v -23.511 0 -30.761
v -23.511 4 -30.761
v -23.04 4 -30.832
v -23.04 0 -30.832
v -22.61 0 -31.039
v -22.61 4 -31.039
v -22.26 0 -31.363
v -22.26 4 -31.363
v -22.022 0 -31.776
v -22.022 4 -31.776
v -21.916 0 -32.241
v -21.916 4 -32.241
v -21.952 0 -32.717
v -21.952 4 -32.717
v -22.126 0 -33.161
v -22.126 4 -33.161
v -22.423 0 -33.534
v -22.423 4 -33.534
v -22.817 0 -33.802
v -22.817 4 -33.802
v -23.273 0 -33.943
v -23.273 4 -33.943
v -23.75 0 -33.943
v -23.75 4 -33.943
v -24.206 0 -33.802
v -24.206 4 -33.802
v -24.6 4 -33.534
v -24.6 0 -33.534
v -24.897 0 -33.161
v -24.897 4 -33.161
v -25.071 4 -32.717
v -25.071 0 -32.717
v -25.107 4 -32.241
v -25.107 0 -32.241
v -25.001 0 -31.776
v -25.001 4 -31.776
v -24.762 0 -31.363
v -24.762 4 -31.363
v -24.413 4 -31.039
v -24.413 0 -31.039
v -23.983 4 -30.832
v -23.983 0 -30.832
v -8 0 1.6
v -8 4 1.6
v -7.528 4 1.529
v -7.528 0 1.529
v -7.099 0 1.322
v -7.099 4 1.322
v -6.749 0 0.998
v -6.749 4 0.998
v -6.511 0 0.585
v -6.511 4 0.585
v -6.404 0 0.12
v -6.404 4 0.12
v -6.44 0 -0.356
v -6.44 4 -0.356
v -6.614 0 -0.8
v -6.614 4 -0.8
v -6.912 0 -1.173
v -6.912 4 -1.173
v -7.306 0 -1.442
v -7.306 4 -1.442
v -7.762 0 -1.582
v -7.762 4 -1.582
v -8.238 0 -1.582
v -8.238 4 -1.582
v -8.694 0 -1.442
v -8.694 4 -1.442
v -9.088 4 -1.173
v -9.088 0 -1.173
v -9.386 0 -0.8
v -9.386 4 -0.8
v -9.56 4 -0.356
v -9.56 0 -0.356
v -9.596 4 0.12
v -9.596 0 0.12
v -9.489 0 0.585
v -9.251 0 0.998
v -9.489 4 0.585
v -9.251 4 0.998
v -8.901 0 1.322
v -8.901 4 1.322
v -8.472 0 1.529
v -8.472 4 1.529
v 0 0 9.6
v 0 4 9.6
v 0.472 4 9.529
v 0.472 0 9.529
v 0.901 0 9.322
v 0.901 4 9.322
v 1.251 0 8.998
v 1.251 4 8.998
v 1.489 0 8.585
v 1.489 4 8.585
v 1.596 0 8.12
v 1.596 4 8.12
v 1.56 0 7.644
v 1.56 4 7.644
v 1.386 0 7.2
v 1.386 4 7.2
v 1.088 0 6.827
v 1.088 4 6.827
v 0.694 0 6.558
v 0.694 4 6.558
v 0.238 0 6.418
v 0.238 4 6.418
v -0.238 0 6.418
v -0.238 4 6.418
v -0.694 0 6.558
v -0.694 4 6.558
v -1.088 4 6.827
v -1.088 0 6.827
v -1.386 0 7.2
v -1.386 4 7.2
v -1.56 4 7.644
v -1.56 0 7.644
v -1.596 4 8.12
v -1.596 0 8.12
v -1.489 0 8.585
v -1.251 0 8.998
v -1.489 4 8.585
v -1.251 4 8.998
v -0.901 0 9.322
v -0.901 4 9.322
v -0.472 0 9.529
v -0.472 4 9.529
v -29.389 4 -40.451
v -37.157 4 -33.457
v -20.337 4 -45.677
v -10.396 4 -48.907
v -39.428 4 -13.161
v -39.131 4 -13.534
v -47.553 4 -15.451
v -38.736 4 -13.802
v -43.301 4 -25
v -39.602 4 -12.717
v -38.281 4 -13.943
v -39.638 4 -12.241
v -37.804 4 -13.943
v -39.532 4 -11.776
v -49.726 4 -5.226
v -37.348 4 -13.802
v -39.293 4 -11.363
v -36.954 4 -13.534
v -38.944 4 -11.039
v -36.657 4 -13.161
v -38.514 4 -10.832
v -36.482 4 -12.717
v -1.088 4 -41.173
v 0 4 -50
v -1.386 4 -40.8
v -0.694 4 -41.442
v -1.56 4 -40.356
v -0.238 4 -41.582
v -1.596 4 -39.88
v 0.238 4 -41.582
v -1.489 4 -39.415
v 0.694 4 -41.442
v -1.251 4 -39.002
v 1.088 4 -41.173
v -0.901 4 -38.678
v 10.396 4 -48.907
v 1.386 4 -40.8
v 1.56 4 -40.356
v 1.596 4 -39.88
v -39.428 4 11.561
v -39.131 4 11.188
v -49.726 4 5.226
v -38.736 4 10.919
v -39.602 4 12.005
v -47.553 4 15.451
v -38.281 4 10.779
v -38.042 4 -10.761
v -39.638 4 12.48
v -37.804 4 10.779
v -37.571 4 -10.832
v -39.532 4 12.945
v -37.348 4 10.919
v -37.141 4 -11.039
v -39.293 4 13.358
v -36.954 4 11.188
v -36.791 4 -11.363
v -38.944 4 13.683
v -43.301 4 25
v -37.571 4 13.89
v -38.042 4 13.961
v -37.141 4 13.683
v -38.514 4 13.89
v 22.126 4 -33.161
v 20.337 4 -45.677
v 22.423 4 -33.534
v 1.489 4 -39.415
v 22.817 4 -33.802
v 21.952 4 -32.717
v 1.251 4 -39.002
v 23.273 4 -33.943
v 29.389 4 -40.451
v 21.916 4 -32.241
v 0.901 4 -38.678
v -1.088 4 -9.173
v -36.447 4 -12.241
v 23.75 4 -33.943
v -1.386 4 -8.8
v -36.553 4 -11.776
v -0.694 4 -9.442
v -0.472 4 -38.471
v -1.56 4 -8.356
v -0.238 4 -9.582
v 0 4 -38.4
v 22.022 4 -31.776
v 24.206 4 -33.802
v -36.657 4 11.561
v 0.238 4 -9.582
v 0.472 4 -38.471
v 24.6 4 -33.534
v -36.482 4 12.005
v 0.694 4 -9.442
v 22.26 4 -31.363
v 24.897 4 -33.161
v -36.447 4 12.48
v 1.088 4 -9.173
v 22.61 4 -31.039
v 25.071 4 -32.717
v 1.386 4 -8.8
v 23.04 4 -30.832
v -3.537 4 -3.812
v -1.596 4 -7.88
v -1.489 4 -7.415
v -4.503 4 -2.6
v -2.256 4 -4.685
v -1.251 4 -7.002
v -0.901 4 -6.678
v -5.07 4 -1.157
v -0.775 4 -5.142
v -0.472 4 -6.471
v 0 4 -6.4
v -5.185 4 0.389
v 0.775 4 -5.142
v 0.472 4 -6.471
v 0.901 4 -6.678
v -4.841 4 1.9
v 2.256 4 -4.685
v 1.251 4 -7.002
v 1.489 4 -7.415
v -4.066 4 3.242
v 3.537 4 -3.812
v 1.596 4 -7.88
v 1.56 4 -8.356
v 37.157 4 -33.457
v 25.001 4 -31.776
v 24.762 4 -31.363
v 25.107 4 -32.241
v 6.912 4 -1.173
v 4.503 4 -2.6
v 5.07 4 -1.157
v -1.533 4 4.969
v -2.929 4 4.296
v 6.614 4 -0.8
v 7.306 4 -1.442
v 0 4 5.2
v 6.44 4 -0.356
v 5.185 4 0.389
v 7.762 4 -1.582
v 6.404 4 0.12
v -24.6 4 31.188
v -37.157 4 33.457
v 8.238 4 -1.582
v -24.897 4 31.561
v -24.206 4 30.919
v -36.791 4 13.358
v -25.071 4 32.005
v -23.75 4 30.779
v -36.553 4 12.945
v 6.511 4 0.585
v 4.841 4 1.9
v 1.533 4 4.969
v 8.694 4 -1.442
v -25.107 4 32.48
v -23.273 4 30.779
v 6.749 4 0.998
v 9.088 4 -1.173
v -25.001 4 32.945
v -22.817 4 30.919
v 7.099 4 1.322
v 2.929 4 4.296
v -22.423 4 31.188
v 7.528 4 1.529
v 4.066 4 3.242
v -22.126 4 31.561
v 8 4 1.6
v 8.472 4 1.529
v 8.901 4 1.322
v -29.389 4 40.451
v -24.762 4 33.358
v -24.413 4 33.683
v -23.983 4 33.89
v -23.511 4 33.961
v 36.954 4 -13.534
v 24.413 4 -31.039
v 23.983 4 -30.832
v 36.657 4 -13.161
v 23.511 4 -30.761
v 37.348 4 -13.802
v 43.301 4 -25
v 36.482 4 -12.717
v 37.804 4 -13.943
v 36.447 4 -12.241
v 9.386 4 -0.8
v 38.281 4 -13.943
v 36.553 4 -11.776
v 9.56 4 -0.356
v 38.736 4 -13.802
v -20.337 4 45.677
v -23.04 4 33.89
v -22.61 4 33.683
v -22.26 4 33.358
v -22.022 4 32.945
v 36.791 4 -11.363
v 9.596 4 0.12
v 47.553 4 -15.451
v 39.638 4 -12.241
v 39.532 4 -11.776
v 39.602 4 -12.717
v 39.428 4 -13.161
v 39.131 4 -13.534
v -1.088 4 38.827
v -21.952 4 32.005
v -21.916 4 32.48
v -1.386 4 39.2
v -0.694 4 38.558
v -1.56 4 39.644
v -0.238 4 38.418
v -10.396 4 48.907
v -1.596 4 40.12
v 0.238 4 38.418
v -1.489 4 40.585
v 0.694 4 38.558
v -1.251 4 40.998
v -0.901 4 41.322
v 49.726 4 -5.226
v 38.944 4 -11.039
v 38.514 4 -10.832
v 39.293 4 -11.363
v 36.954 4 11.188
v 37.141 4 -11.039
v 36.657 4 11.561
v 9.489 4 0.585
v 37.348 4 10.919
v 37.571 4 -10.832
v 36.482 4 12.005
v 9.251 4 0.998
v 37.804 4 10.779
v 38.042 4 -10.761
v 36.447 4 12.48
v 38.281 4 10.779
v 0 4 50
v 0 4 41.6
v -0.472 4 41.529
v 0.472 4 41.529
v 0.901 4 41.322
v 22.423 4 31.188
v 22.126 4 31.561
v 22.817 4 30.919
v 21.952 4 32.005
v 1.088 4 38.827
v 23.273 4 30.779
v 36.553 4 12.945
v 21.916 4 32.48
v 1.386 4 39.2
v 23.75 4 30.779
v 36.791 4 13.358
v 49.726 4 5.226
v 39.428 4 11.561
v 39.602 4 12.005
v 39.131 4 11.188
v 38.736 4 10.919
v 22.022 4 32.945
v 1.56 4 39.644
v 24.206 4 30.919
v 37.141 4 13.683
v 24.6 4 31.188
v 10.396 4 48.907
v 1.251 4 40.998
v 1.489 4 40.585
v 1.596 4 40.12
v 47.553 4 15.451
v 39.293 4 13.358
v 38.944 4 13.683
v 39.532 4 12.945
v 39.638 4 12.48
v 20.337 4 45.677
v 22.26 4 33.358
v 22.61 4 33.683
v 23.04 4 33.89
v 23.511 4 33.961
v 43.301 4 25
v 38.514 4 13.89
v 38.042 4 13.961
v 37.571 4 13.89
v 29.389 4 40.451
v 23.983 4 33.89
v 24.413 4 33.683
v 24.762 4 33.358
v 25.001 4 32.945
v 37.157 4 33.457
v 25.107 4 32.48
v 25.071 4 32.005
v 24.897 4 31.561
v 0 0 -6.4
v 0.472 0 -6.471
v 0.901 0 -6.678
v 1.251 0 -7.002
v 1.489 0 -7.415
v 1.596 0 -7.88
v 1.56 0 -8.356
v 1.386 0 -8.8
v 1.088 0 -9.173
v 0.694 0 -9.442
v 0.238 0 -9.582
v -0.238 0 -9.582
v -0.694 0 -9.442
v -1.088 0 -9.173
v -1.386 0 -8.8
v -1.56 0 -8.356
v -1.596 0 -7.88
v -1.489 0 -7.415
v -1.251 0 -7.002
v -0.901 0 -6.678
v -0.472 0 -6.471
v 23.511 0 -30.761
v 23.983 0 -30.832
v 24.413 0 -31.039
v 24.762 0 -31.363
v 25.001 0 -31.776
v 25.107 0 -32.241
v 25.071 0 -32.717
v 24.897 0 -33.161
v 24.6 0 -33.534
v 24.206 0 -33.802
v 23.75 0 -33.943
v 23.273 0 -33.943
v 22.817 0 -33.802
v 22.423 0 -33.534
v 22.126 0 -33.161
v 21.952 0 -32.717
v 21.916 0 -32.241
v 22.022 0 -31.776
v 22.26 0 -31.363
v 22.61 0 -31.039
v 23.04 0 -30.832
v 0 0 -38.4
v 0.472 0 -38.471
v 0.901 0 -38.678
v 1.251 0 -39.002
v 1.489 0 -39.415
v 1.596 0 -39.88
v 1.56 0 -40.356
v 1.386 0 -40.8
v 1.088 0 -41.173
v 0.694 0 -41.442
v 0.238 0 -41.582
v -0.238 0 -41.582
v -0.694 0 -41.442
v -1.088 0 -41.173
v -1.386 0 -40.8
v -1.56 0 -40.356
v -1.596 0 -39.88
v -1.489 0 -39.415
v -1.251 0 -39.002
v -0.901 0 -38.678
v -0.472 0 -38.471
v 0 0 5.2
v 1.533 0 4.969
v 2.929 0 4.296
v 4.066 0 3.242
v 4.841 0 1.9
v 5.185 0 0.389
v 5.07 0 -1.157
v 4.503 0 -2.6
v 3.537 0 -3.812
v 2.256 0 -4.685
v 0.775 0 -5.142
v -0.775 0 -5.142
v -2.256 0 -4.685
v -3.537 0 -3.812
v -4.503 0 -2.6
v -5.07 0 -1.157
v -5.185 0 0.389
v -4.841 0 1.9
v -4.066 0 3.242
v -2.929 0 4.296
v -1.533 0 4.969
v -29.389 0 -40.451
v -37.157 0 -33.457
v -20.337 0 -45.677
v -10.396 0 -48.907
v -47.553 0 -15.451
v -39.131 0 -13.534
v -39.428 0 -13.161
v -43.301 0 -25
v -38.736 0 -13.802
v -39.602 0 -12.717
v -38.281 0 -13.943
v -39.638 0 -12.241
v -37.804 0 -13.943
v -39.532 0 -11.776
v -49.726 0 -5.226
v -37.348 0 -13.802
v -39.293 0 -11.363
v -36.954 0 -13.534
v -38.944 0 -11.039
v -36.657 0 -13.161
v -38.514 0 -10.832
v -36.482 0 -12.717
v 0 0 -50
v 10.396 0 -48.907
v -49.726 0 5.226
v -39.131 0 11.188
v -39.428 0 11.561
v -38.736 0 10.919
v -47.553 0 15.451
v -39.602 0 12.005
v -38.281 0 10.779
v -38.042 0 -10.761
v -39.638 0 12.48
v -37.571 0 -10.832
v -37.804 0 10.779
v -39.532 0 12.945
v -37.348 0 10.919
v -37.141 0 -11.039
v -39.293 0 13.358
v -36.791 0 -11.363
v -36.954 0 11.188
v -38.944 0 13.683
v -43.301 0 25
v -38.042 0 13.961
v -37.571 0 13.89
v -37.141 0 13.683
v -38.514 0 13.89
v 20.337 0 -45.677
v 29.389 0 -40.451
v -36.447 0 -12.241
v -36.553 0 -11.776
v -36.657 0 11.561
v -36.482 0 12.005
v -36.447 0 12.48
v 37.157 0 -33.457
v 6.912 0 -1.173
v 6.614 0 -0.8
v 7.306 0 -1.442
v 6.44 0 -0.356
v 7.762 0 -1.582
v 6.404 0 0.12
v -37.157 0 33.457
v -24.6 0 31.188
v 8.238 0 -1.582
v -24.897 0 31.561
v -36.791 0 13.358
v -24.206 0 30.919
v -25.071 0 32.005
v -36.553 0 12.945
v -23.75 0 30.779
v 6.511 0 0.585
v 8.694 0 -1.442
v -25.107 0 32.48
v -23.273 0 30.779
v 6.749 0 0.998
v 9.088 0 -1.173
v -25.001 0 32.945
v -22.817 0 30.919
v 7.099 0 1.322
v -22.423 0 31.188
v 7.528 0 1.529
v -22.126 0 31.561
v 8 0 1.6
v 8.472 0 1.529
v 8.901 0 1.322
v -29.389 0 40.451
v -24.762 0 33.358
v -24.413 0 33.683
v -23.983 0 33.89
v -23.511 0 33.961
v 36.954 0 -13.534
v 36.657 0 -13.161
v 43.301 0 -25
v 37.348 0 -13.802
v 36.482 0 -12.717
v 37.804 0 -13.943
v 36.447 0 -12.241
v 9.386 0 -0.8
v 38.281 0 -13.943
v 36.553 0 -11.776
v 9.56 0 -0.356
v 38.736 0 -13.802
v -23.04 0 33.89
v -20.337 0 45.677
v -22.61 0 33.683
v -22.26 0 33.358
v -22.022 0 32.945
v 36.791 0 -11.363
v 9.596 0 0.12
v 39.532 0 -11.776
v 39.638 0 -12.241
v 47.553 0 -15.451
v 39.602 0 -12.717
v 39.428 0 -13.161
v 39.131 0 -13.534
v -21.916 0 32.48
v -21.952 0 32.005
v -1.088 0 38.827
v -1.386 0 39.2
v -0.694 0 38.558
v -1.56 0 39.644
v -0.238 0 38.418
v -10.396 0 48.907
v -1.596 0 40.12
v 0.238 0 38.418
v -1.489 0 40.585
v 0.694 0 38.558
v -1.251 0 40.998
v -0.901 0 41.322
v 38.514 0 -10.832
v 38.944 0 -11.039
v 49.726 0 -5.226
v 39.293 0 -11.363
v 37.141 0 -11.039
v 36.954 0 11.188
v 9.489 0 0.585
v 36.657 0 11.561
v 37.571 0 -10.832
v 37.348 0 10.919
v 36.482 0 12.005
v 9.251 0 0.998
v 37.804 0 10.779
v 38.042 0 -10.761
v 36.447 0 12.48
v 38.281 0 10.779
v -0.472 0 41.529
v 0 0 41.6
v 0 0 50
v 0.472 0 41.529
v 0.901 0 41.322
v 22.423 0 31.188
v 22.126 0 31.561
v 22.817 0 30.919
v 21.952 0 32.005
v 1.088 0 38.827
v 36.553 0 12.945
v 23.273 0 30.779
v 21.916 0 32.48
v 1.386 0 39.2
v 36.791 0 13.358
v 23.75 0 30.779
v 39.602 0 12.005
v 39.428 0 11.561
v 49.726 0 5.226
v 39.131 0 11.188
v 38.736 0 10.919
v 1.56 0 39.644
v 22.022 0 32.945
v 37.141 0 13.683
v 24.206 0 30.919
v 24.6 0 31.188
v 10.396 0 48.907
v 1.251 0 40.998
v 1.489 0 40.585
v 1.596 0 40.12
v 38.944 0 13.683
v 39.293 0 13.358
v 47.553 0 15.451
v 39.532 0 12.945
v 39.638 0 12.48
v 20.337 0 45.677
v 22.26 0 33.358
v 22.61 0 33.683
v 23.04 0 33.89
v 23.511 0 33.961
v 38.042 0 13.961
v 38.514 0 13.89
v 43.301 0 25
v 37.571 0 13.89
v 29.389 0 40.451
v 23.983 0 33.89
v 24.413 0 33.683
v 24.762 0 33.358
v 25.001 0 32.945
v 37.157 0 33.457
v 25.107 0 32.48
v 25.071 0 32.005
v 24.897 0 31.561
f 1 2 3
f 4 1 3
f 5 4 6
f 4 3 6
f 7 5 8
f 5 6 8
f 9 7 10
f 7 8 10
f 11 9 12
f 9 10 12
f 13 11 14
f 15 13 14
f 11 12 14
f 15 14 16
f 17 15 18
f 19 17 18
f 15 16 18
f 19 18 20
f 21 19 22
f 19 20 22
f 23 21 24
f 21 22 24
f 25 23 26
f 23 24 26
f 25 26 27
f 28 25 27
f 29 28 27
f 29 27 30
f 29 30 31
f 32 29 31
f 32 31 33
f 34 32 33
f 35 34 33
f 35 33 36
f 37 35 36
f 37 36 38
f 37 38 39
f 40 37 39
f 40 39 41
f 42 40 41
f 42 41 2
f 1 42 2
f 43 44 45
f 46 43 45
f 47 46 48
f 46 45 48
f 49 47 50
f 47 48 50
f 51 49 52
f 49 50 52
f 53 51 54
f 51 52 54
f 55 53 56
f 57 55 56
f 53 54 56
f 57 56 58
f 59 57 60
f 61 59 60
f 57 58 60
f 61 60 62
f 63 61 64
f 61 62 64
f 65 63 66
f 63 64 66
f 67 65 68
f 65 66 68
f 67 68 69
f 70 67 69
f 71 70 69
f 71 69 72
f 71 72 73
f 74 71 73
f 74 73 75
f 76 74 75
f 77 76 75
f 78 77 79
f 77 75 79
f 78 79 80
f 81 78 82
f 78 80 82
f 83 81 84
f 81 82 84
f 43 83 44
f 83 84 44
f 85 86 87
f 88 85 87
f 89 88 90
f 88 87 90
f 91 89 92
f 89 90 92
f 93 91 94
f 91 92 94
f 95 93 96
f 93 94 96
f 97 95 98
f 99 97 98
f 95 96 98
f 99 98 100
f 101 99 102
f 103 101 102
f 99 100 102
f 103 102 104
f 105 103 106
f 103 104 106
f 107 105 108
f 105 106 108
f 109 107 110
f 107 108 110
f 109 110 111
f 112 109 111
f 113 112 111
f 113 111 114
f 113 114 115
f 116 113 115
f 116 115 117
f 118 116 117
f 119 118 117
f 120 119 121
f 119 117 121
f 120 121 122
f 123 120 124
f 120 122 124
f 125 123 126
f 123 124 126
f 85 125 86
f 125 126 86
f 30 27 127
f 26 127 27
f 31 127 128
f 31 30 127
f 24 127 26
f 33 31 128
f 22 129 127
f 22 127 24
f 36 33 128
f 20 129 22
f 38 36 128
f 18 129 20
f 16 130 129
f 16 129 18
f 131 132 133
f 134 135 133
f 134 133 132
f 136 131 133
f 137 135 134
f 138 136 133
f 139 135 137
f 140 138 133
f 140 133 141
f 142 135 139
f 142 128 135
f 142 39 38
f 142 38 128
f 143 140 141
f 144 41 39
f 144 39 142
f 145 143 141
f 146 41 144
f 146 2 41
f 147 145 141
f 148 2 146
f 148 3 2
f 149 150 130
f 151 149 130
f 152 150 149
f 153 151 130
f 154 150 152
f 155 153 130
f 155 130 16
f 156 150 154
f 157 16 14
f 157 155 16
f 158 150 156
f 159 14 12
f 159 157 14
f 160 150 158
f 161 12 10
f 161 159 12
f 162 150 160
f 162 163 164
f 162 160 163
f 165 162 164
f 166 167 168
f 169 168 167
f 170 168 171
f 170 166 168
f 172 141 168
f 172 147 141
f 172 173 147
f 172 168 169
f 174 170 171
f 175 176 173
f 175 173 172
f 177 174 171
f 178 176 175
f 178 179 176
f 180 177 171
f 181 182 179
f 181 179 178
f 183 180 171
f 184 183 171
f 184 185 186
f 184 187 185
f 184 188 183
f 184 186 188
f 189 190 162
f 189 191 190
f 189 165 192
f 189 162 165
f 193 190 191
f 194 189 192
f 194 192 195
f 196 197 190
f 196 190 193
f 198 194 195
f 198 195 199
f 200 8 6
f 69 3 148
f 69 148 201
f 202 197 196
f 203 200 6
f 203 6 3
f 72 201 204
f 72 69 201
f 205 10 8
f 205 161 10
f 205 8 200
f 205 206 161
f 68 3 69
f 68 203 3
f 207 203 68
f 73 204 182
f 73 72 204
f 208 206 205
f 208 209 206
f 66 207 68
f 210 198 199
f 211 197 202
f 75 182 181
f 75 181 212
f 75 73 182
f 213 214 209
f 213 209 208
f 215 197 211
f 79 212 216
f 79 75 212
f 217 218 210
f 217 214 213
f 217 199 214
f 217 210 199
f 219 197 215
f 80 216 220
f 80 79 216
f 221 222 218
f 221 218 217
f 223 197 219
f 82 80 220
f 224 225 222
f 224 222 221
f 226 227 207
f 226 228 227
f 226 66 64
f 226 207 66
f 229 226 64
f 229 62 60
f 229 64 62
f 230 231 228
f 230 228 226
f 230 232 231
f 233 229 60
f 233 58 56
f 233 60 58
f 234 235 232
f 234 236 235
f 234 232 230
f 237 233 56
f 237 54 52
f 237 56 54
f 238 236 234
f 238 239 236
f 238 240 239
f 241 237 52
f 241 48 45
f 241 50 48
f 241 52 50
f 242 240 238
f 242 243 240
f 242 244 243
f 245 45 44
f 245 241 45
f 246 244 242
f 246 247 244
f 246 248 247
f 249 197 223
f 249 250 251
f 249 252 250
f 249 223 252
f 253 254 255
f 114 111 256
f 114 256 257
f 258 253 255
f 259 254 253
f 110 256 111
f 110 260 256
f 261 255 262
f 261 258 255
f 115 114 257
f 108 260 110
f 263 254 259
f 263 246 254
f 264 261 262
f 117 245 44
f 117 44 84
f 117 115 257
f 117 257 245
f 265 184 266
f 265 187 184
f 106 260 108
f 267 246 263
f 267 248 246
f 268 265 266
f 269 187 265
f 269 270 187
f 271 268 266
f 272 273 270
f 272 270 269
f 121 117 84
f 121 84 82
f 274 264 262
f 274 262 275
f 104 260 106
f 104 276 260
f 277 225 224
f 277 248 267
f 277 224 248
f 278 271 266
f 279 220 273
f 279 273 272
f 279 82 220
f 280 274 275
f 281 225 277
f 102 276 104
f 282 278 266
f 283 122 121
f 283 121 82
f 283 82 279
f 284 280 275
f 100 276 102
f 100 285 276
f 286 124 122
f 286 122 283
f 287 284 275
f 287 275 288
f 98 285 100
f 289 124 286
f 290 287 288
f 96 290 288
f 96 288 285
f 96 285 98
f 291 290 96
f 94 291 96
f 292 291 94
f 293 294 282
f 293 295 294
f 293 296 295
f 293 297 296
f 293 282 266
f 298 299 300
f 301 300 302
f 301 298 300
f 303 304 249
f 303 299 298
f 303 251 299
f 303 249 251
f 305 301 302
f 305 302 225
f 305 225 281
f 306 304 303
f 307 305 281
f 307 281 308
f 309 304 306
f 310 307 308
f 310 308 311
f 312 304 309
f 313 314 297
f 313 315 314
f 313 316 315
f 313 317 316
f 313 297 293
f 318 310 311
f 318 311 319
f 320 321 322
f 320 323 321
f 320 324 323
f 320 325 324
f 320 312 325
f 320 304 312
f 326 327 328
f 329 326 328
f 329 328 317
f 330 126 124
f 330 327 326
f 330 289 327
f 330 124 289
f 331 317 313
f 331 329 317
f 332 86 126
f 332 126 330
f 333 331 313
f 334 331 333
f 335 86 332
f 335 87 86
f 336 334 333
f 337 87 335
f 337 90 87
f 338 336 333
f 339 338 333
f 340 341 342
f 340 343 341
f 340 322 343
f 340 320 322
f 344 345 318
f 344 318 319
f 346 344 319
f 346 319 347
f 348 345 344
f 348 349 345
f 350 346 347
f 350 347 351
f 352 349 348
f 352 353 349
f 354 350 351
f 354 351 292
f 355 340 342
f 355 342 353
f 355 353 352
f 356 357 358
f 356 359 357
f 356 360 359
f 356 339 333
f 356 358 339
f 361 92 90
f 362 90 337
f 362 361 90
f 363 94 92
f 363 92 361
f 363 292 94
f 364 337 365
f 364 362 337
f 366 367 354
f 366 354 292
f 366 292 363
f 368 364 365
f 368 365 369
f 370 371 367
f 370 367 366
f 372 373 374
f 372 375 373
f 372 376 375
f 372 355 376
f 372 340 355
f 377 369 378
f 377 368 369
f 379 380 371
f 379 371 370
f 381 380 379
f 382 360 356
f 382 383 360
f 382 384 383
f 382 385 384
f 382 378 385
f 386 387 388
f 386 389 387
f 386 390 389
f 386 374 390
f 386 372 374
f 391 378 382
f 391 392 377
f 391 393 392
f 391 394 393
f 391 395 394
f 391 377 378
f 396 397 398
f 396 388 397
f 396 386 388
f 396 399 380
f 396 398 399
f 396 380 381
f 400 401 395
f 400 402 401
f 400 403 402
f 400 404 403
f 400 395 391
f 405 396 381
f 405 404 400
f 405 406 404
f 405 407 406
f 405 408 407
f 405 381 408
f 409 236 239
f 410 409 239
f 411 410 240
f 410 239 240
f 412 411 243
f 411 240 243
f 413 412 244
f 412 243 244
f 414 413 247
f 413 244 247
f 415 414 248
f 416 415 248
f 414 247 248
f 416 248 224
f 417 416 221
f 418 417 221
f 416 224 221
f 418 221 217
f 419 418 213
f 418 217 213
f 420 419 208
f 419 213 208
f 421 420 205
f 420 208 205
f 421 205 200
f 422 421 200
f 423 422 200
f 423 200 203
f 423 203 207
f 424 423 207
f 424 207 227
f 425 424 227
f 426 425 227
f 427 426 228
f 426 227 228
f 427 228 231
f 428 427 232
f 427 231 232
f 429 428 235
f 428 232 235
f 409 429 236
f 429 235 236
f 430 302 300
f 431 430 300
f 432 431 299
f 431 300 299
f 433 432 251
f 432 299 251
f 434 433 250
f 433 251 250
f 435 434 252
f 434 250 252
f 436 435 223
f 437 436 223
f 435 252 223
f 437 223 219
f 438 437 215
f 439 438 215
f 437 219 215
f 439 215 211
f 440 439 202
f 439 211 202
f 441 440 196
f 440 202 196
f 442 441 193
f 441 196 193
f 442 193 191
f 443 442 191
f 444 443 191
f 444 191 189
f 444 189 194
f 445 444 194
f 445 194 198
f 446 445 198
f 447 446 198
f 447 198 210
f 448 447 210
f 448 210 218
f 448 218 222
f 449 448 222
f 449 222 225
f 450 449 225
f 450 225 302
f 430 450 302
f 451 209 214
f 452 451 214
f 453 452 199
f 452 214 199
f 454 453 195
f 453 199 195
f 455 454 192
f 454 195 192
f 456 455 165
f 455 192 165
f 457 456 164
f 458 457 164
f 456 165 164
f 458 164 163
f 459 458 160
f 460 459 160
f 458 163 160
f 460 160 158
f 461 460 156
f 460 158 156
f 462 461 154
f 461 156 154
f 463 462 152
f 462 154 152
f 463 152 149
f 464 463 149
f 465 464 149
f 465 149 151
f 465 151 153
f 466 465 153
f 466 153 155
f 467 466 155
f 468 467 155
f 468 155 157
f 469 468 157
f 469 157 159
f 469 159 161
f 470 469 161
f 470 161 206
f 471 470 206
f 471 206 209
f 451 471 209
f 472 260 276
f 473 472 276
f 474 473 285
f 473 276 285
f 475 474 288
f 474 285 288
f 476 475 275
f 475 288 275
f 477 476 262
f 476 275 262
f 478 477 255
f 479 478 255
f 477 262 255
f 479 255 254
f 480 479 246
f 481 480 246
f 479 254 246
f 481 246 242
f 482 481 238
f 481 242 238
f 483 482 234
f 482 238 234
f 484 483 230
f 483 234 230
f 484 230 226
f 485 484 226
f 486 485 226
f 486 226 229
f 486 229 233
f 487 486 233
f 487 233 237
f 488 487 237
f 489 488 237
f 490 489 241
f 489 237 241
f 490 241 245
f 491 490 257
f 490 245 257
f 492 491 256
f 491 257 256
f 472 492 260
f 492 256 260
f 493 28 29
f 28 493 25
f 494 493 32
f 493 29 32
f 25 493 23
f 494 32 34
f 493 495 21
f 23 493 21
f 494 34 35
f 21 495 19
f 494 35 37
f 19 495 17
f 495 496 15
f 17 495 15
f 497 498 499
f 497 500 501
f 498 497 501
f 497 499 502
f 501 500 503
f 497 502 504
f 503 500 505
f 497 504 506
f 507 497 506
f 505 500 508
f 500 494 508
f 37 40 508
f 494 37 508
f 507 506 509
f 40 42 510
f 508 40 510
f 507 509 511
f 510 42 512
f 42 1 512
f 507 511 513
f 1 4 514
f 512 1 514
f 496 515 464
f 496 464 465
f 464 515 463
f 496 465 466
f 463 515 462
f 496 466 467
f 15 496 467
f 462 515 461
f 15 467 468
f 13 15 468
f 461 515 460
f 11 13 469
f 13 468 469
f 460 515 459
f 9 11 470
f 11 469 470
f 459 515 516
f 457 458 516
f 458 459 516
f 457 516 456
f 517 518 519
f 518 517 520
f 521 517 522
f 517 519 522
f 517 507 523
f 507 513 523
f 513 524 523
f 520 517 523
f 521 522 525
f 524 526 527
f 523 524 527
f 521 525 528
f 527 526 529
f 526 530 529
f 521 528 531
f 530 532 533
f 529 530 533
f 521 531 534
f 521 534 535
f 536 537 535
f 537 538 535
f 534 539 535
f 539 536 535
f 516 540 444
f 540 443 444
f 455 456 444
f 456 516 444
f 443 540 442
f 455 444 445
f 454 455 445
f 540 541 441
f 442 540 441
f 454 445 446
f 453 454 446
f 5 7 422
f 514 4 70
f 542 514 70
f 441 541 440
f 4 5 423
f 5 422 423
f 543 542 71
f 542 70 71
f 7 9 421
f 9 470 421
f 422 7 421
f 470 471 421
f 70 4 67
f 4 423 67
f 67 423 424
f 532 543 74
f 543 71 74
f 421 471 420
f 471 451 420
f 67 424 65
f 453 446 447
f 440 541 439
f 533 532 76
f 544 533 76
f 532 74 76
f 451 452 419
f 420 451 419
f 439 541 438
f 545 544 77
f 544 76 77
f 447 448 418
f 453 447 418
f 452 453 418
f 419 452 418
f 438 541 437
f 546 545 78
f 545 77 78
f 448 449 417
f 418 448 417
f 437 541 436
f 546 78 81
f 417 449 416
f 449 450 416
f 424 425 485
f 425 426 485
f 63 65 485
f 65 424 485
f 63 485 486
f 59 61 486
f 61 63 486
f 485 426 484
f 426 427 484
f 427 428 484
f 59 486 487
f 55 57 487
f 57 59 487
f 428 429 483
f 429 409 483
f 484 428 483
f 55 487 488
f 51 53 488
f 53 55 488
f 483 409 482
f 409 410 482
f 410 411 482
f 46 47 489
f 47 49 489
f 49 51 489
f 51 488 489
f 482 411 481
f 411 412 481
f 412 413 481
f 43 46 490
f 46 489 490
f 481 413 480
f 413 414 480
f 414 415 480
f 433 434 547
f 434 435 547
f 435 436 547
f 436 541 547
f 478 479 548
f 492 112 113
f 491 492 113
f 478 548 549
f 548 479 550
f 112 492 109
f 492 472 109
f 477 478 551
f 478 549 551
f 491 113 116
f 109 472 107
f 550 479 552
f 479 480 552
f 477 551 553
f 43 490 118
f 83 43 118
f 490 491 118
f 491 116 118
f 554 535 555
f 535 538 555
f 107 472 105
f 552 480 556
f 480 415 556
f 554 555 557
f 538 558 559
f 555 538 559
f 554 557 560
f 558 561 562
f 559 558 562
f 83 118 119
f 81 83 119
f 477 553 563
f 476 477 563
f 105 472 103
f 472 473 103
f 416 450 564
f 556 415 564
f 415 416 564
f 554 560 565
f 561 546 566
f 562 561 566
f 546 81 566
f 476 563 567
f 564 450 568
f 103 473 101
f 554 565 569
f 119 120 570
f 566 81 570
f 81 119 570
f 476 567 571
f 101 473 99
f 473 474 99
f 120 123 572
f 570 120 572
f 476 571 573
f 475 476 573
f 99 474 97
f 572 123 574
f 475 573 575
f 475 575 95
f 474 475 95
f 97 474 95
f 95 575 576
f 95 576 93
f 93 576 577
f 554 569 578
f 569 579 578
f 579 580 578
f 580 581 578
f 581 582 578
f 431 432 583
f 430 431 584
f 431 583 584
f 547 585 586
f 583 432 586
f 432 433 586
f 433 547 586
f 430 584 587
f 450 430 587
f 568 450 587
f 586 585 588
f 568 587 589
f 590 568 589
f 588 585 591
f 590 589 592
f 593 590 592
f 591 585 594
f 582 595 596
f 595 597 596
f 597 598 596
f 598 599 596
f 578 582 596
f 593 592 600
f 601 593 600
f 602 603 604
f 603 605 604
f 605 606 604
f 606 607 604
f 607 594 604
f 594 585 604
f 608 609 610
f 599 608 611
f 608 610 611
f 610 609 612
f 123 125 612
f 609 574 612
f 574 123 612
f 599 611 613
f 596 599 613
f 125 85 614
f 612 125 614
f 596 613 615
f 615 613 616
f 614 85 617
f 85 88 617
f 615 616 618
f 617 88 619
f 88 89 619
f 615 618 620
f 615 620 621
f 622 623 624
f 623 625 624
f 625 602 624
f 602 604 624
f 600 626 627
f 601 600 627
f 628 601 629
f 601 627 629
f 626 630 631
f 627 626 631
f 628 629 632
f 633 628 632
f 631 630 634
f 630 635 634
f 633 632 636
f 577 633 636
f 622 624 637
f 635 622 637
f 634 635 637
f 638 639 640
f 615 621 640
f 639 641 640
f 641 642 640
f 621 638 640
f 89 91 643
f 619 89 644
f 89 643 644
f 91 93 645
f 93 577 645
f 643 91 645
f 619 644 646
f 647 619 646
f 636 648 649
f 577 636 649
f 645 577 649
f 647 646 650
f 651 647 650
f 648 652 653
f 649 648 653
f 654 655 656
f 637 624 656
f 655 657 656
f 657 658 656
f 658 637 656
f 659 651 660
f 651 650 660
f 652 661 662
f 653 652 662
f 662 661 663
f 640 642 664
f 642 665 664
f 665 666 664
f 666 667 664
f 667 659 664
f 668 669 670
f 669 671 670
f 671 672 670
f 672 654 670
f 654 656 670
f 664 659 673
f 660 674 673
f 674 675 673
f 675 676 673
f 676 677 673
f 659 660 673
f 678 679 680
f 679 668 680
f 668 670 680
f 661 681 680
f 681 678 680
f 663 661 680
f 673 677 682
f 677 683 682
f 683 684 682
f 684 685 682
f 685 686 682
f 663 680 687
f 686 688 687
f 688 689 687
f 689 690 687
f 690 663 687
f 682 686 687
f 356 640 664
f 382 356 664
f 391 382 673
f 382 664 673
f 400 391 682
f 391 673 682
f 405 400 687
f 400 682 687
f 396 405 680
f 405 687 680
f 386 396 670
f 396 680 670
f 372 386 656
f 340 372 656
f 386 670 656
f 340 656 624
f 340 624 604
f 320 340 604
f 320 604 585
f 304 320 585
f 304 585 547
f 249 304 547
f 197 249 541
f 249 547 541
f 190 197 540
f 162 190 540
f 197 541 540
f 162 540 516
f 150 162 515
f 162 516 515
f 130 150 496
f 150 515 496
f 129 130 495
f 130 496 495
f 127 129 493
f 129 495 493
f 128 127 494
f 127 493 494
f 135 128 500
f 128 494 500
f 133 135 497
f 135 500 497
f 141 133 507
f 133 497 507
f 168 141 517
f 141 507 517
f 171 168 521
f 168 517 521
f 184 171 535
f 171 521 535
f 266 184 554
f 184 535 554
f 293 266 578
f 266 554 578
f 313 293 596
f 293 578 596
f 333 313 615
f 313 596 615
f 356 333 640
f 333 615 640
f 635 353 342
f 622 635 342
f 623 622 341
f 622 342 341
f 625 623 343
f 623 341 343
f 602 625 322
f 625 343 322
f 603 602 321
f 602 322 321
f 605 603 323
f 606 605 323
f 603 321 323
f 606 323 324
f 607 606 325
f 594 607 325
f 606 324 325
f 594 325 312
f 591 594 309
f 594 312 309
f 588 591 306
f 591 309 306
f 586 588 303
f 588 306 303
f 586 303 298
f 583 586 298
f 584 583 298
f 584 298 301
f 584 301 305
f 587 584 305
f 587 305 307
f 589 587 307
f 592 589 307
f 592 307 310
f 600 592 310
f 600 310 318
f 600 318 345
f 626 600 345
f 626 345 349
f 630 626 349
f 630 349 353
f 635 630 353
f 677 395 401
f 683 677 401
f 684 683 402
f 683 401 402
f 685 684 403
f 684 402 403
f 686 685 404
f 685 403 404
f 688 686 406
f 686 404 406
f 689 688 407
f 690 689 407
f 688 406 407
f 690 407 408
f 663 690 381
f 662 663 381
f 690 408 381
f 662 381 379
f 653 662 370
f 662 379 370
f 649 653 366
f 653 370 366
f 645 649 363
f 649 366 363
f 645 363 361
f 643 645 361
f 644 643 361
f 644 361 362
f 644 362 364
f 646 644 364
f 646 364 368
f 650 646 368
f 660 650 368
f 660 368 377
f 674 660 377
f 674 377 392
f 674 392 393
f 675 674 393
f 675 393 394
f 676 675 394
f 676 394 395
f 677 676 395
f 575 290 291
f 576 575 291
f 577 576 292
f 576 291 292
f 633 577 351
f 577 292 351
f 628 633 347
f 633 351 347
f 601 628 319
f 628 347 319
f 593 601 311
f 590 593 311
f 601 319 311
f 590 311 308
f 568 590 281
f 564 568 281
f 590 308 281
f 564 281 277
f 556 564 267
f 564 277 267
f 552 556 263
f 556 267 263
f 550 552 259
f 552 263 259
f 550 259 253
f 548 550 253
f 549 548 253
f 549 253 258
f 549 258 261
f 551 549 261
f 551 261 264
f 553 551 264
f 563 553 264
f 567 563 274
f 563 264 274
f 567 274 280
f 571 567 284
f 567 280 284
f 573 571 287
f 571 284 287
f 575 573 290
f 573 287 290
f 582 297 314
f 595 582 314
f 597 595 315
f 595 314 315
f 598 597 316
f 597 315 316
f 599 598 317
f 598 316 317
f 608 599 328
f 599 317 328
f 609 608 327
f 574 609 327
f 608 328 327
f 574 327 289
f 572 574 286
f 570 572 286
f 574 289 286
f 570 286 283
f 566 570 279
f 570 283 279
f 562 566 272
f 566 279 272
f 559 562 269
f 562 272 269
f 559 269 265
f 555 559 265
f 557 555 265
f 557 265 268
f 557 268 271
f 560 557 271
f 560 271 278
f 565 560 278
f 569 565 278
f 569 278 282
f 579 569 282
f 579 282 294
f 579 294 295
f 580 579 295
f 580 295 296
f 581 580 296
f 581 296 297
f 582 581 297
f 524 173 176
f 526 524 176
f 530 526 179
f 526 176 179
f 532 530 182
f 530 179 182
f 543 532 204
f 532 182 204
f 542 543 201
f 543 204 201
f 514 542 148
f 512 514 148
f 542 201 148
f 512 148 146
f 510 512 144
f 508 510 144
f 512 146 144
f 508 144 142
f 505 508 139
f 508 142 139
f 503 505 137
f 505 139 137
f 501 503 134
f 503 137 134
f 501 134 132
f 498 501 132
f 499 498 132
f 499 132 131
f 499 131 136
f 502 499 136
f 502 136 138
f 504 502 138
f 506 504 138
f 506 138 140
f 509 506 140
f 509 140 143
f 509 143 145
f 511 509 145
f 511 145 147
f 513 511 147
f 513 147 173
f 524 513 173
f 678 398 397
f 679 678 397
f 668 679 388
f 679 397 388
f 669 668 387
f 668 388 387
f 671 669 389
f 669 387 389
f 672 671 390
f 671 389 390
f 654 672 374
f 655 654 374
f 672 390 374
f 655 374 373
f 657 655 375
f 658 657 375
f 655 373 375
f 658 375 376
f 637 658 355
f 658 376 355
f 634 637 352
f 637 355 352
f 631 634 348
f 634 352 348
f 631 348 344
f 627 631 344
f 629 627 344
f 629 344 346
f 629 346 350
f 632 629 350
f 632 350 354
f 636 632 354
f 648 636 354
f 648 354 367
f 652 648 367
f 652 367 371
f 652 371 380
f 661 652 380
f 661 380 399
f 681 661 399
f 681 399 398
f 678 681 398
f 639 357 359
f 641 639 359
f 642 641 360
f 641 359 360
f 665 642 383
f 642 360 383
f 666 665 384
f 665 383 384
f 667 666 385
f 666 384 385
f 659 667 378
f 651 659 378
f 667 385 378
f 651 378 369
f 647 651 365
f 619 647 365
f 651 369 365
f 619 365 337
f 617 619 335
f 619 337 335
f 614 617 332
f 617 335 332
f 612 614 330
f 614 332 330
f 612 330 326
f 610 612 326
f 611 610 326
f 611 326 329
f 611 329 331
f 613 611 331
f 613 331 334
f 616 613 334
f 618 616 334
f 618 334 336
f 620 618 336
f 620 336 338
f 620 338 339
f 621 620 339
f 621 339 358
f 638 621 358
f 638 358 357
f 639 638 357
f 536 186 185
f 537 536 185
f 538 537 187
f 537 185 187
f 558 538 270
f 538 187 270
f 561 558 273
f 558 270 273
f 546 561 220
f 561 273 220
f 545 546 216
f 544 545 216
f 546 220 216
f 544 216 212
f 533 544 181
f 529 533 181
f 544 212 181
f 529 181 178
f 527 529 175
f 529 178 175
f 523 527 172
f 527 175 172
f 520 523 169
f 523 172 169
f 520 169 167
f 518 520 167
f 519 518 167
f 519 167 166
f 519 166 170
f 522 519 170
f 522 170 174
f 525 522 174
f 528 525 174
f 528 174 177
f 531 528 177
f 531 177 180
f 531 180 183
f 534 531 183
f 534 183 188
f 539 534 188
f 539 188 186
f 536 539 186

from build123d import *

# Parameters (mm, degrees)
SKETCH_1_R          = 50
EXTRUDE_1_DEPTH     = 4
SKETCH_2_R          = 1.6
SKETCH_2_R_2        = 5.2
CUT_EXTRUDE_1_DEPTH = 4
SKETCH_3_R          = 1.6
CUT_EXTRUDE_2_DEPTH = 10


with BuildPart() as part:
    # 草图1 → 凸台-拉伸1 (new body)
    with BuildSketch(Plane(origin=(0, 0, 0), x_dir=(1, 0, 0), z_dir=(0, 1, 0))):
        with Locations(Location((0, 0, 0), (0, 0, 270))):
            Circle(SKETCH_1_R)
    extrude(amount=EXTRUDE_1_DEPTH)

    # 草图2 → 切除-拉伸1 (cut)
    with BuildSketch(Plane(origin=(0, 4, 0), x_dir=(1, 0, 0), z_dir=(0, 1, 0))):
        with Locations(Location((0, 8, 0), (0, 0, 270))):
            Circle(SKETCH_2_R)
        with Locations(Location((8, 0, 0), (0, 0, 270))):
            Circle(SKETCH_2_R)
        with Locations(Location((0, -8, 0), (0, 0, 270))):
            Circle(SKETCH_2_R)
        with Locations(Location((-8, 0, 0), (0, 0, 270))):
            Circle(SKETCH_2_R)
        with Locations(Location((0, 0, 0), (0, 0, 270))):
            Circle(SKETCH_2_R_2)
    extrude(amount=-CUT_EXTRUDE_1_DEPTH, mode=Mode.SUBTRACT)

    # 草图3 → 切除-拉伸2 (cut)
    with BuildSketch(Plane(origin=(0, 4, 0), x_dir=(1, 0, 0), z_dir=(0, 1, 0))):
        with Locations(Location((0, 40, 0), (0, 0, 270))):
            Circle(SKETCH_3_R)
        with Locations(Location((23.511410092, 32.360679775, 0), (0, 0, 270))):
            Circle(SKETCH_3_R)
        with Locations(Location((38.042260652, 12.360679775, 0), (0, 0, 270))):
            Circle(SKETCH_3_R)
        with Locations(Location((38.042260652, -12.360679775, 0), (0, 0, 270))):
            Circle(SKETCH_3_R)
        with Locations(Location((23.511410092, -32.360679775, 0), (0, 0, 270))):
            Circle(SKETCH_3_R)
        with Locations(Location((0, -40, 0), (0, 0, 270))):
            Circle(SKETCH_3_R)
        with Locations(Location((-23.511410092, -32.360679775, 0), (0, 0, 270))):
            Circle(SKETCH_3_R)
        with Locations(Location((-38.042260652, -12.360679775, 0), (0, 0, 270))):
            Circle(SKETCH_3_R)
        with Locations(Location((-38.042260652, 12.360679775, 0), (0, 0, 270))):
            Circle(SKETCH_3_R)
        with Locations(Location((-23.511410092, 32.360679775, 0), (0, 0, 270))):
            Circle(SKETCH_3_R)
    extrude(amount=-CUT_EXTRUDE_2_DEPTH, mode=Mode.SUBTRACT)


solid = part.part
